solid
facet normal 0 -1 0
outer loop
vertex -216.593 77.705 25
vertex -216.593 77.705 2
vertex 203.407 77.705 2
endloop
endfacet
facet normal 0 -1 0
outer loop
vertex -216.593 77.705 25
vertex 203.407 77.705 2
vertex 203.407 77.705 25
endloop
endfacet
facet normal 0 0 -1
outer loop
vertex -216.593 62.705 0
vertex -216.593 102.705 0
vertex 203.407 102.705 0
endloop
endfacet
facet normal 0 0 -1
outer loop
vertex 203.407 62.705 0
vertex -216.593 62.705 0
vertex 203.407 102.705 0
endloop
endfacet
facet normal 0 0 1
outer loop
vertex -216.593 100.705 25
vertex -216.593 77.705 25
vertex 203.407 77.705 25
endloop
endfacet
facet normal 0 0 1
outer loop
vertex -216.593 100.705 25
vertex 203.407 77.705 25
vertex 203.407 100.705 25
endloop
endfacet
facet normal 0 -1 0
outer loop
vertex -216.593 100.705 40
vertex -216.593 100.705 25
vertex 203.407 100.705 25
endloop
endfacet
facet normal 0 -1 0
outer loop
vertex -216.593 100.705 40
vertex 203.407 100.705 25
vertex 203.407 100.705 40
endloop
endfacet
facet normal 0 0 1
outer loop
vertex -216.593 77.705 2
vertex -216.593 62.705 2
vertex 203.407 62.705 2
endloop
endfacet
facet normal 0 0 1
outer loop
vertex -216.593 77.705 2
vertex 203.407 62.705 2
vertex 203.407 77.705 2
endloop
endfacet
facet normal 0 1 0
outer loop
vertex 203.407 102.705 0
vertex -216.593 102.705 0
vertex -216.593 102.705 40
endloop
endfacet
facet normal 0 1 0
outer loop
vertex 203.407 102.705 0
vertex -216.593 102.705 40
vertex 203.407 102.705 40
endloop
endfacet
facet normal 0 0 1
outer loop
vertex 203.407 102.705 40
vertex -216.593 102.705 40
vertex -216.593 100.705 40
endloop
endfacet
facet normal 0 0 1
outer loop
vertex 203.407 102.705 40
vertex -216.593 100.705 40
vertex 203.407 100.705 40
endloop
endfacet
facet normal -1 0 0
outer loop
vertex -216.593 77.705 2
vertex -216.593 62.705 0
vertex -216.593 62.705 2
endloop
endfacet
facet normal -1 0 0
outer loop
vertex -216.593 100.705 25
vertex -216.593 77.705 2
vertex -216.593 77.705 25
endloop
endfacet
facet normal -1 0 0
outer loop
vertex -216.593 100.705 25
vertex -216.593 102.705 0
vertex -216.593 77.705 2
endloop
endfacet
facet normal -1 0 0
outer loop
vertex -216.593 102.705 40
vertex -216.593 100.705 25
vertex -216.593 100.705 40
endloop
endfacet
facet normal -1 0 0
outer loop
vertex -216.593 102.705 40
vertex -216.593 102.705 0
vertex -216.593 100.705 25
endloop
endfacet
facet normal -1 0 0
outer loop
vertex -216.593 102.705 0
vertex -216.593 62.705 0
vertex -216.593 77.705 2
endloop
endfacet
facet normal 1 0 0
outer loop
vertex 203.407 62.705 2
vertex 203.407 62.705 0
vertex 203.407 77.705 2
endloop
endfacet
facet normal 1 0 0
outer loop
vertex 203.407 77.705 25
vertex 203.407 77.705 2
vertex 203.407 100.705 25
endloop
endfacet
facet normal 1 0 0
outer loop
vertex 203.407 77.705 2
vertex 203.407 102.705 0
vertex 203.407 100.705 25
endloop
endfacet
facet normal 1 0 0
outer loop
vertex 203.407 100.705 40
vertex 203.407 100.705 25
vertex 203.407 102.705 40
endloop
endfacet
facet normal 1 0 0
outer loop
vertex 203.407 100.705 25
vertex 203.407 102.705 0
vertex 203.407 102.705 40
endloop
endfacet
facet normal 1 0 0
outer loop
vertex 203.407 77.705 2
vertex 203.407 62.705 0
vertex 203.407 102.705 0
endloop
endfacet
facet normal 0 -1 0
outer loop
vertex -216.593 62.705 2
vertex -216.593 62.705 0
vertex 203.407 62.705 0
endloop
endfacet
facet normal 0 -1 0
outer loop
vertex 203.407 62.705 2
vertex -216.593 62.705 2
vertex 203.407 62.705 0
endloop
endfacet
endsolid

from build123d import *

# Parameters (mm, degrees)
SKETCH2_W           = 420
SKETCH2_H           = 40
BOSS_EXTRUDE1_DEPTH = 40
SKETCH3_W           = 38
SKETCH3_H           = 38
CUT_EXTRUDE1_DEPTH  = 1000
SKETCH4_W           = 23
SKETCH4_H           = 23
BOSS_EXTRUDE2_DEPTH = 420


with BuildPart() as part:
    # Sketch2 → Boss-Extrude1 (new body)
    with BuildSketch(Plane.XY):
        with Locations((-6.593186373, 82.705410822)):
            Rectangle(SKETCH2_W, SKETCH2_H)
    extrude(amount=BOSS_EXTRUDE1_DEPTH)

    # Sketch3 → Cut-Extrude1 (cut)
    with BuildSketch(Plane.ZY.offset(216.593186373)):
        with Locations((21, 81.705410822)):
            Rectangle(SKETCH3_W, SKETCH3_H)
    extrude(amount=-CUT_EXTRUDE1_DEPTH, mode=Mode.SUBTRACT)

    # Sketch4 → Boss-Extrude2 (add)
    with BuildSketch(Plane.ZY.offset(216.593186373)):
        with Locations((13.5, 89.205410822)):
            Rectangle(SKETCH4_W, SKETCH4_H)
    extrude(amount=-BOSS_EXTRUDE2_DEPTH)


solid = part.part
